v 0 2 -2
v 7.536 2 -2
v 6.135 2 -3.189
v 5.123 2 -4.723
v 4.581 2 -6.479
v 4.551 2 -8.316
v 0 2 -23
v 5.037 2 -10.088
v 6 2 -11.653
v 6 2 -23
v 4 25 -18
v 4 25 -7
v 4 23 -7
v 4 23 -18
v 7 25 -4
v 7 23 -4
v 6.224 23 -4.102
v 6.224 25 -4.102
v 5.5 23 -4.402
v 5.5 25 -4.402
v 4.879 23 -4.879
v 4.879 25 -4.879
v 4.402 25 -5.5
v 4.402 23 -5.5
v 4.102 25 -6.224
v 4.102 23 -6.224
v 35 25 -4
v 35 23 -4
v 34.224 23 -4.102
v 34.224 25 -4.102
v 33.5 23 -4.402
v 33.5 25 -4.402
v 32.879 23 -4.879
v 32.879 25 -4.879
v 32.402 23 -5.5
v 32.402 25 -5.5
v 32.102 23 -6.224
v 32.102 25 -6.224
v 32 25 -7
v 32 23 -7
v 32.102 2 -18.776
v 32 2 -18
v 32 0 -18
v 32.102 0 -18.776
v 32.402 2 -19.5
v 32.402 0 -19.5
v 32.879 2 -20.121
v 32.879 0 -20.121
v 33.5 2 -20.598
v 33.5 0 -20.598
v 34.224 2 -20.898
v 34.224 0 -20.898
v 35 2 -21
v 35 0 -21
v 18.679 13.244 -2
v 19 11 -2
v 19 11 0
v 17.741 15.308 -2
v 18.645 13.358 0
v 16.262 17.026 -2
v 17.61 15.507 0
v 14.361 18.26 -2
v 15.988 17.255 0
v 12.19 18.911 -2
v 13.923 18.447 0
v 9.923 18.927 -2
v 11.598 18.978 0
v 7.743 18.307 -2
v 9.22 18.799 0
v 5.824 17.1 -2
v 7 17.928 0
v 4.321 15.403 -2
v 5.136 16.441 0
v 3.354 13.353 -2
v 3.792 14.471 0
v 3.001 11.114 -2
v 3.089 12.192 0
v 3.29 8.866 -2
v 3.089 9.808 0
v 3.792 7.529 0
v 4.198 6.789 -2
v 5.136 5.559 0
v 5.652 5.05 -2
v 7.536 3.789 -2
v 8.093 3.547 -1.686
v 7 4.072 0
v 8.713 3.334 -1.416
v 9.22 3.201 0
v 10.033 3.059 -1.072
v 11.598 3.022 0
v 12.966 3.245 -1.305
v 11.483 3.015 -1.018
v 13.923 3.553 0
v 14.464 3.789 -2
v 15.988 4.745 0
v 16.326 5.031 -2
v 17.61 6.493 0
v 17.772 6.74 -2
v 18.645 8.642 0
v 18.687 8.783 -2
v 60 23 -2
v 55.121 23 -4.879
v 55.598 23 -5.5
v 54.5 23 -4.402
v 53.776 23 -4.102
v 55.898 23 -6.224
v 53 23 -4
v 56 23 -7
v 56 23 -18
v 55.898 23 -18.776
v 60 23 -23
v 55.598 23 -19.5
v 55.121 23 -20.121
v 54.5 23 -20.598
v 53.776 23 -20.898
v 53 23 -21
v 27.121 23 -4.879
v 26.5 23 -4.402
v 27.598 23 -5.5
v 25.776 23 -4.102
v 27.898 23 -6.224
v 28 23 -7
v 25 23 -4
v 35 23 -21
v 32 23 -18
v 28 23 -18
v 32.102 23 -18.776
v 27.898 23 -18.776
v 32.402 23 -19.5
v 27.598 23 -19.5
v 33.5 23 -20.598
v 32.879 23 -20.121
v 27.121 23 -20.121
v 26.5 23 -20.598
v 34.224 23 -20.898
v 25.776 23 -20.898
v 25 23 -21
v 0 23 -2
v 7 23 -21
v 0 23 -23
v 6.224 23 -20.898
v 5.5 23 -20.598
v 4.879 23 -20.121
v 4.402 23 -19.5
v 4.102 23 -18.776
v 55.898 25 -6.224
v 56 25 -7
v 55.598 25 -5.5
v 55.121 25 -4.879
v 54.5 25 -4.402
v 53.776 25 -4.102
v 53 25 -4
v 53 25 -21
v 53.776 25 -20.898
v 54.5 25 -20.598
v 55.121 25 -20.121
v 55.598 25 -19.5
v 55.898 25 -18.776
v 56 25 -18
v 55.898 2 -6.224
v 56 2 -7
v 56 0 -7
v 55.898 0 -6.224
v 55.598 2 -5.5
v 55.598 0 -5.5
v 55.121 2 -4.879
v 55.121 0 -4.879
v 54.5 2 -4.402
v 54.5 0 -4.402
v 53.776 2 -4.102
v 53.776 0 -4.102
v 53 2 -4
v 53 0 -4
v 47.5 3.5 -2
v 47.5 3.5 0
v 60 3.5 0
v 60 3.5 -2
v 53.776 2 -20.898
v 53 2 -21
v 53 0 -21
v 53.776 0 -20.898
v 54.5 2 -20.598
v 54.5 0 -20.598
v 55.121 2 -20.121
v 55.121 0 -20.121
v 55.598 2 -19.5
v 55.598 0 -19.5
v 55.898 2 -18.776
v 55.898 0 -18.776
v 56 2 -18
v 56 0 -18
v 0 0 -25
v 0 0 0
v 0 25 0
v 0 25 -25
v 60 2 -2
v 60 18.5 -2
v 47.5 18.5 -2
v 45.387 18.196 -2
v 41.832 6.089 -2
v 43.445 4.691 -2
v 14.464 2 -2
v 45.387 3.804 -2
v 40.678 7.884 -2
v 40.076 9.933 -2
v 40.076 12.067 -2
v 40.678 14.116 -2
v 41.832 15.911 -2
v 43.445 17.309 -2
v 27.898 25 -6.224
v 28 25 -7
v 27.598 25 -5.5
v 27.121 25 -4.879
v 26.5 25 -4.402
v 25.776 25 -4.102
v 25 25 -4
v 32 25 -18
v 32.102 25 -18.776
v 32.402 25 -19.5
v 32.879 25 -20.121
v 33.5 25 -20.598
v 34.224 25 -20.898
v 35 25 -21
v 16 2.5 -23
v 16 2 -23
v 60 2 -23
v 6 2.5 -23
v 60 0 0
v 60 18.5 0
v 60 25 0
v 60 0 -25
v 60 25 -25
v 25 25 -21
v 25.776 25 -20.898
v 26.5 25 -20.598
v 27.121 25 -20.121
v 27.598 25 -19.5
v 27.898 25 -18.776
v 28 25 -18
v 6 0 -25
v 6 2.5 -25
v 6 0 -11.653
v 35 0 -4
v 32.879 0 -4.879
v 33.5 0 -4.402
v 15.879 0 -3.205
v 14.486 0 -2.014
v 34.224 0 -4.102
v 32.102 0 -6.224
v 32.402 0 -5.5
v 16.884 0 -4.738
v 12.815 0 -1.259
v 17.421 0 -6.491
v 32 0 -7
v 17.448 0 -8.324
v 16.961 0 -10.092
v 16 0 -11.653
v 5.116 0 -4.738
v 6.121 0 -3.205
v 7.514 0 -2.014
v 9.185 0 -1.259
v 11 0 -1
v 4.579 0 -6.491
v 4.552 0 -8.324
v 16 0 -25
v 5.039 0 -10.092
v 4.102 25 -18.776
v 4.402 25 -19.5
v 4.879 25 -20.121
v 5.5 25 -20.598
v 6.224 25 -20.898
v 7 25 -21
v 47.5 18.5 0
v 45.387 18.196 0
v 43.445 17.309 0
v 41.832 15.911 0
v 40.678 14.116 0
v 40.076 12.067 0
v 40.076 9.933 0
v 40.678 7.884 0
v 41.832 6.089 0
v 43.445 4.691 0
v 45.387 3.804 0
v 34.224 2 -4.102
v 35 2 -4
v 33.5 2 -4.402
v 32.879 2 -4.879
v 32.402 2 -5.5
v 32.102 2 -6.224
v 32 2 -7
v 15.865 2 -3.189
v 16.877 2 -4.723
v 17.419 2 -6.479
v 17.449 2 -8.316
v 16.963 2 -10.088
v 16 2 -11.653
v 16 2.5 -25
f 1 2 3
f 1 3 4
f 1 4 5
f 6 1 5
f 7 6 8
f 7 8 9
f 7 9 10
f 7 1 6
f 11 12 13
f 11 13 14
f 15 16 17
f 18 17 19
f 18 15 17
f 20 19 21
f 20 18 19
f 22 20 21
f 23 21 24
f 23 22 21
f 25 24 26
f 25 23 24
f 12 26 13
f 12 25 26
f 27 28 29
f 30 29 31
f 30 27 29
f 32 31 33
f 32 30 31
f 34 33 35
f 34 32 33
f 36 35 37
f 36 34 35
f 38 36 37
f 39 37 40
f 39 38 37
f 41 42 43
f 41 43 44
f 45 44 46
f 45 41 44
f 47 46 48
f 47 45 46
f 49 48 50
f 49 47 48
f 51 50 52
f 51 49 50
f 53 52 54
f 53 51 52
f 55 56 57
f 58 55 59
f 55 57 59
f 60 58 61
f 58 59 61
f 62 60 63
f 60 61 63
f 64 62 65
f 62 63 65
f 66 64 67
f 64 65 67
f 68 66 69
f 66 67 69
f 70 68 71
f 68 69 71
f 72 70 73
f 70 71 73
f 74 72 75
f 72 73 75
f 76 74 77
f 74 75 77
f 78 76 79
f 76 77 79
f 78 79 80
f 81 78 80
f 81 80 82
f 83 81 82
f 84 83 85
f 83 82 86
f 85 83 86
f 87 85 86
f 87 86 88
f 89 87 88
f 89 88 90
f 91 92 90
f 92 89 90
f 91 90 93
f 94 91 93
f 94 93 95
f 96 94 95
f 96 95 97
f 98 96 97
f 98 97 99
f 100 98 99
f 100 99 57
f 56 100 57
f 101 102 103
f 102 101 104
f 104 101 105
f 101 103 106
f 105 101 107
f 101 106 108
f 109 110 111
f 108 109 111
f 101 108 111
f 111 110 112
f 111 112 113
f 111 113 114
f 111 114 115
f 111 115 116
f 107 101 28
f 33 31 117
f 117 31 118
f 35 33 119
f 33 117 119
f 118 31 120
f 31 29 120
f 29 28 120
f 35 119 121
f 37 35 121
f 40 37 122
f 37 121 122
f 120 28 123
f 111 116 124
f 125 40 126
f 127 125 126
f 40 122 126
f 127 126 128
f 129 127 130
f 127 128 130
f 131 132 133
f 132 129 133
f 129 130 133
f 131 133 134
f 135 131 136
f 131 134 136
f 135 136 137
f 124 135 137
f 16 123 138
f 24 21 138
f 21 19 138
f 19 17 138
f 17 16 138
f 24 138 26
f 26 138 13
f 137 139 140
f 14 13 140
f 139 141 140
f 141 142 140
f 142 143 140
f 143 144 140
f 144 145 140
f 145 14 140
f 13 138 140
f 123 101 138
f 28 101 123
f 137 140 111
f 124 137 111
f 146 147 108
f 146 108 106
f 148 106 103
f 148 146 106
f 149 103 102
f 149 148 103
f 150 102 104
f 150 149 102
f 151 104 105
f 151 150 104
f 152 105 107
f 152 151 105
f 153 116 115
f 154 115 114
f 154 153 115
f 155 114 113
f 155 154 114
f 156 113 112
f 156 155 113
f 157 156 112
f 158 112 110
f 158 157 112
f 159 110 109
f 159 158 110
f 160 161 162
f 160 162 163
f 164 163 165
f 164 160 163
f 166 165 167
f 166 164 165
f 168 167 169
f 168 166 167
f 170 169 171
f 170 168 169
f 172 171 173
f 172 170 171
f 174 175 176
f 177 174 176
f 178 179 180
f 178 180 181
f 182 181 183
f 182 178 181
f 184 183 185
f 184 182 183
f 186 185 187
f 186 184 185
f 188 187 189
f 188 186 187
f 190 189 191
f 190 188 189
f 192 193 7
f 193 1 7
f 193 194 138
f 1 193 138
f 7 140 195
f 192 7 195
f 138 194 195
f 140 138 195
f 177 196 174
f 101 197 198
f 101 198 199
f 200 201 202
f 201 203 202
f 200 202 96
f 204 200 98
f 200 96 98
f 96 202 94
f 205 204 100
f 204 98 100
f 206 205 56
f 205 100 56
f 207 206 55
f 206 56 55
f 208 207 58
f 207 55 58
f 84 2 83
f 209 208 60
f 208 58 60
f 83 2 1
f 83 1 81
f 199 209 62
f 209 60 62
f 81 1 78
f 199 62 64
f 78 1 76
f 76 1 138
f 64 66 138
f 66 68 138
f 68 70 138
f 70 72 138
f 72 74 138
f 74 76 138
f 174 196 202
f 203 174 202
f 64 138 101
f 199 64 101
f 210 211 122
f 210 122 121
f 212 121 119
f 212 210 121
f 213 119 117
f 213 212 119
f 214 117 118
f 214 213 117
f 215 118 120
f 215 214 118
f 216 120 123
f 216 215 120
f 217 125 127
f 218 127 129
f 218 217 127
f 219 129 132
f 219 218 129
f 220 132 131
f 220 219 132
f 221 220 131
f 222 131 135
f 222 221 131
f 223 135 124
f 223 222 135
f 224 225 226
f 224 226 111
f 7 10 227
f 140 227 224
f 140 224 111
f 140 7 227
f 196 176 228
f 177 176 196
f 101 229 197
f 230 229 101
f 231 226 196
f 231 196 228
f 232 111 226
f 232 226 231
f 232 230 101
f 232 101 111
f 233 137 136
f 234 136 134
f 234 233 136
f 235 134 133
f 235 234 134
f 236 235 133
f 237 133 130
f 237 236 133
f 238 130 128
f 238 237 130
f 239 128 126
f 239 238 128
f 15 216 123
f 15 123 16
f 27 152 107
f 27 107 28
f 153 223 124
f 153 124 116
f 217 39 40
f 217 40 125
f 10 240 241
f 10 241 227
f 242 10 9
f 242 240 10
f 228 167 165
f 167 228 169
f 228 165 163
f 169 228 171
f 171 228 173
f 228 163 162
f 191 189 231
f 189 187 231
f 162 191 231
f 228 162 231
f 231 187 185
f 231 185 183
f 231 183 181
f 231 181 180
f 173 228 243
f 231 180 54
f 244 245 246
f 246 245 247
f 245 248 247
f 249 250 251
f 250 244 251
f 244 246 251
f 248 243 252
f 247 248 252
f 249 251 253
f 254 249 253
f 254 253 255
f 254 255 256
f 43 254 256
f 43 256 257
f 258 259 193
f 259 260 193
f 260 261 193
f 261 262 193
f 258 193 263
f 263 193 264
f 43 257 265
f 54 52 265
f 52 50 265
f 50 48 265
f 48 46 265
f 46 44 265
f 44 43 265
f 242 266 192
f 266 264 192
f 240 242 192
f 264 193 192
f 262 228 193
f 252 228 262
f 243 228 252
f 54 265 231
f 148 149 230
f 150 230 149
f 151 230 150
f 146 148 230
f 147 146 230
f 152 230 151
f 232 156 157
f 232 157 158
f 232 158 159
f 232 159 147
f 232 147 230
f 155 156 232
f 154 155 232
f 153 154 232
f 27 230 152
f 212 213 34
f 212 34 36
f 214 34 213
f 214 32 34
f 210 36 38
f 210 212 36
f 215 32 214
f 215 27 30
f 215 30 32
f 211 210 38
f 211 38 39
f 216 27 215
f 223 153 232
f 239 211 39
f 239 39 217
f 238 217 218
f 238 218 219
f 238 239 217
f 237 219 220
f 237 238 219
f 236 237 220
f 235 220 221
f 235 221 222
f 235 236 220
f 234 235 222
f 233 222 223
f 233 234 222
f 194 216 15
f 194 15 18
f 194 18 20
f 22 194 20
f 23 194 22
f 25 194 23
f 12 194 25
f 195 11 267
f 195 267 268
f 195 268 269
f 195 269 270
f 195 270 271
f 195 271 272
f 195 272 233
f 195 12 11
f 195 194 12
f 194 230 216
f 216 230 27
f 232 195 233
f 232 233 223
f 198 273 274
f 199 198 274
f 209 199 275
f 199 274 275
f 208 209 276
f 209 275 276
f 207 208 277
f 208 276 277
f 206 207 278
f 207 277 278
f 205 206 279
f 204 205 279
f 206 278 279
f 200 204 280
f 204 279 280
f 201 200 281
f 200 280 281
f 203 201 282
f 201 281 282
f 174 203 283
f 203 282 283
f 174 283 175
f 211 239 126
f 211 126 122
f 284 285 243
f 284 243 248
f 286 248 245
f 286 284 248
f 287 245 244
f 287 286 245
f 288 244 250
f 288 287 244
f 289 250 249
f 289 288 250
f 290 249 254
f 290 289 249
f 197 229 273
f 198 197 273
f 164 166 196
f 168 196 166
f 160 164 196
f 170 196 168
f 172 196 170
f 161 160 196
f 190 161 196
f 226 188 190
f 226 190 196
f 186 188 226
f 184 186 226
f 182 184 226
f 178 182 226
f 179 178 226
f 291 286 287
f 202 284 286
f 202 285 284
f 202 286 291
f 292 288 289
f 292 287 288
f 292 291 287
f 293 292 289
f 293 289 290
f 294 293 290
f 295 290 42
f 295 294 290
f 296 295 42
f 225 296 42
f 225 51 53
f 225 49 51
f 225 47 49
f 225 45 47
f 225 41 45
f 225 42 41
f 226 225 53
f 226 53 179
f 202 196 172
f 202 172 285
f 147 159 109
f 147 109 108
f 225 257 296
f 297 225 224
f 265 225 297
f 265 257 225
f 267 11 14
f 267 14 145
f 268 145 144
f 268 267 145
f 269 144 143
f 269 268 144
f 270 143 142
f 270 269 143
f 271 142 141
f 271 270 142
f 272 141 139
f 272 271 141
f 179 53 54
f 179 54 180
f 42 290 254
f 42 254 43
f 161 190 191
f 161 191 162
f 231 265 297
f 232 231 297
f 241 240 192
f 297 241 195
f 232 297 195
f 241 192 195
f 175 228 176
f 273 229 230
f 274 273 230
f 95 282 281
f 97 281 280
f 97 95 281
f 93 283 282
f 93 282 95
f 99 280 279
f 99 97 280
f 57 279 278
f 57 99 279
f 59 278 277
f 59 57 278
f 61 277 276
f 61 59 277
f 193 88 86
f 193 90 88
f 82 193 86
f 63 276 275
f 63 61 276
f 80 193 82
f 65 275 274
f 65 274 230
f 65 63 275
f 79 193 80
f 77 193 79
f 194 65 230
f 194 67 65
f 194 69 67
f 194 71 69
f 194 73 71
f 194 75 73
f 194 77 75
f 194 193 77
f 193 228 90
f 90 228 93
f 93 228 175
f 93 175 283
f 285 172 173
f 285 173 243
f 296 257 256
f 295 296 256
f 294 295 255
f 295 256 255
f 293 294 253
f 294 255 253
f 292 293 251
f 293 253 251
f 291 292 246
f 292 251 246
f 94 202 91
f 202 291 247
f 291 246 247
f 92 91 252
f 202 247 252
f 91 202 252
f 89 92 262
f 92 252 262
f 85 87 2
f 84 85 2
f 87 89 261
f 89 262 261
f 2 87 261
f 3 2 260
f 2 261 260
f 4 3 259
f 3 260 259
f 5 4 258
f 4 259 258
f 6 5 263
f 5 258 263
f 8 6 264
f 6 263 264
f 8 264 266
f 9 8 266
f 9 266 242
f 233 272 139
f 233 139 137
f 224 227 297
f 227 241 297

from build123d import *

# Parameters (mm, degrees)
SKETCH_1_W          = 25
SKETCH_1_H          = 25
SKETCH_1_W_2        = 21
SKETCH_1_H_2        = 21
EXTRUDE_1_DEPTH     = 60
CUT_EXTRUDE_1_REACH = 71.642
SKETCH_2_R          = 8
SKETCH_2_R_2        = 7.5
SKETCH_3_R          = 6.5
CUT_EXTRUDE_2_DEPTH = 4.5
CUT_EXTRUDE_3_DEPTH = 2.5
CUT_EXTRUDE_4_REACH = 71.642
CUT_EXTRUDE_5_REACH = 71.642
CUT_EXTRUDE_6_REACH = 71.642


with BuildPart() as part:
    # Эскиз1 → Бобышка-Вытянуть1 (new body)
    with BuildSketch(Plane(origin=(0, 0, 0), x_dir=(0, 0, -1), z_dir=(1, 0, 0))):
        with Locations((12.5, 12.5)):
            Rectangle(SKETCH_1_W, SKETCH_1_H)
        with Locations((12.5, 12.5)):
            Rectangle(SKETCH_1_W_2, SKETCH_1_H_2, mode=Mode.SUBTRACT)
    extrude(amount=EXTRUDE_1_DEPTH)

    # Эскиз2 → Вырез-Вытянуть1 (cut, up to next)
    with BuildSketch(Plane.XY, mode=Mode.PRIVATE) as cut_extrude_1_sk1:
        with Locations((11, 11)):
            Circle(SKETCH_2_R)
    cut_extrude_1_tool1 = extrude(cut_extrude_1_sk1.sketch, amount=-CUT_EXTRUDE_1_REACH, mode=Mode.PRIVATE) & part.part
    # Эскиз2 → Вырез-Вытянуть1 (cut, up to next)
    with BuildSketch(Plane.XY, mode=Mode.PRIVATE) as cut_extrude_1_sk2:
        with Locations((47.5, 11)):
            Circle(SKETCH_2_R_2)
    cut_extrude_1_tool2 = extrude(cut_extrude_1_sk2.sketch, amount=-CUT_EXTRUDE_1_REACH, mode=Mode.PRIVATE) & part.part
    add(cut_extrude_1_tool1.solids().sort_by_distance((11, 11, 0))[0], mode=Mode.SUBTRACT)
    add(cut_extrude_1_tool2.solids().sort_by_distance((47.5, 11, 0))[0], mode=Mode.SUBTRACT)

    # Эскиз3 → Вырез-Вытянуть2 (cut)
    with BuildSketch(Plane.XZ):
        with Locations((11, -7.5)):
            Circle(SKETCH_3_R)
    extrude(amount=-CUT_EXTRUDE_2_DEPTH, mode=Mode.SUBTRACT)

    # Эскиз4 → Вырез-Вытянуть3 (cut)
    with BuildSketch(Plane(origin=(0, 0, 0), x_dir=(1, 0, 0), z_dir=(0, 1, 0))):
        with BuildLine():
            Line((16, 11.653311931), (16, 25))
            Line((16, 25), (6, 25))
            Line((6, 25), (6, 11.653311931))
            ThreePointArc((6, 11.653311931), (11, 14), (16, 11.653311931))
        make_face()
    extrude(amount=CUT_EXTRUDE_3_DEPTH, mode=Mode.SUBTRACT)

    # Эскиз5 → Вырез-Вытянуть4 (cut, up to next)
    with BuildSketch(Plane.XY, mode=Mode.PRIVATE) as cut_extrude_4_sk1:
        with BuildLine():
            Line((60, 18.5), (47.5, 18.5))
            ThreePointArc((47.5, 18.5), (52.803300859, 16.303300859), (55, 11))
            ThreePointArc((55, 11), (52.803300859, 5.696699141), (47.5, 3.5))
            Line((47.5, 3.5), (60, 3.5))
            Line((60, 3.5), (60, 18.5))
        make_face()
    cut_extrude_4_tool1 = extrude(cut_extrude_4_sk1.sketch, amount=-CUT_EXTRUDE_4_REACH, mode=Mode.PRIVATE) & part.part
    add(cut_extrude_4_tool1.solids().sort_by_distance((56.483263, 11, 0))[0], mode=Mode.SUBTRACT)

    # Эскиз6 → Вырез-Вытянуть5 (cut, up to next)
    with BuildSketch(Plane(origin=(0, 25, 0), x_dir=(1, 0, 0), z_dir=(0, 1, 0)), mode=Mode.PRIVATE) as cut_extrude_5_sk1:
        with BuildLine():
            ThreePointArc((4, 7), (4.878679656, 4.878679656), (7, 4))
            Line((7, 4), (25, 4))
            ThreePointArc((25, 4), (27.121320344, 4.878679656), (28, 7))
            Line((28, 7), (28, 18))
            ThreePointArc((28, 18), (27.121320344, 20.121320344), (25, 21))
            Line((25, 21), (7, 21))
            ThreePointArc((7, 21), (4.878679656, 20.121320344), (4, 18))
            Line((4, 18), (4, 7))
        make_face()
    cut_extrude_5_tool1 = extrude(cut_extrude_5_sk1.sketch, amount=-CUT_EXTRUDE_5_REACH, mode=Mode.PRIVATE) & part.part
    # Эскиз6 → Вырез-Вытянуть5 (cut, up to next)
    with BuildSketch(Plane(origin=(0, 25, 0), x_dir=(1, 0, 0), z_dir=(0, 1, 0)), mode=Mode.PRIVATE) as cut_extrude_5_sk2:
        with BuildLine():
            Line((32, 18), (32, 7))
            ThreePointArc((32, 7), (32.878679656, 4.878679656), (35, 4))
            Line((35, 4), (53, 4))
            ThreePointArc((53, 4), (55.121320344, 4.878679656), (56, 7))
            Line((56, 7), (56, 18))
            ThreePointArc((56, 18), (55.121320344, 20.121320344), (53, 21))
            Line((53, 21), (35, 21))
            ThreePointArc((35, 21), (32.878679656, 20.121320344), (32, 18))
        make_face()
    cut_extrude_5_tool2 = extrude(cut_extrude_5_sk2.sketch, amount=-CUT_EXTRUDE_5_REACH, mode=Mode.PRIVATE) & part.part
    add(cut_extrude_5_tool1.solids().sort_by_distance((16, 25, -12.5))[0], mode=Mode.SUBTRACT)
    add(cut_extrude_5_tool2.solids().sort_by_distance((44, 25, -12.5))[0], mode=Mode.SUBTRACT)

    # Эскиз6<3> → Вырез-Вытянуть6 (cut, up to next)
    with BuildSketch(Plane(origin=(0, 25, 0), x_dir=(1, 0, 0), z_dir=(0, 1, 0)), mode=Mode.PRIVATE) as cut_extrude_6_sk1:
        with BuildLine():
            Line((32, 18), (32, 7))
            ThreePointArc((32, 7), (32.878679656, 4.878679656), (35, 4))
            Line((35, 4), (53, 4))
            ThreePointArc((53, 4), (55.121320344, 4.878679656), (56, 7))
            Line((56, 7), (56, 18))
            ThreePointArc((56, 18), (55.121320344, 20.121320344), (53, 21))
            Line((53, 21), (35, 21))
            ThreePointArc((35, 21), (32.878679656, 20.121320344), (32, 18))
        make_face()
    cut_extrude_6_tool1 = extrude(cut_extrude_6_sk1.sketch, amount=-CUT_EXTRUDE_6_REACH, mode=Mode.PRIVATE) & part.part
    add(cut_extrude_6_tool1.solids().sort_by_distance((44, 25, -12.5))[0], mode=Mode.SUBTRACT)


solid = part.part
